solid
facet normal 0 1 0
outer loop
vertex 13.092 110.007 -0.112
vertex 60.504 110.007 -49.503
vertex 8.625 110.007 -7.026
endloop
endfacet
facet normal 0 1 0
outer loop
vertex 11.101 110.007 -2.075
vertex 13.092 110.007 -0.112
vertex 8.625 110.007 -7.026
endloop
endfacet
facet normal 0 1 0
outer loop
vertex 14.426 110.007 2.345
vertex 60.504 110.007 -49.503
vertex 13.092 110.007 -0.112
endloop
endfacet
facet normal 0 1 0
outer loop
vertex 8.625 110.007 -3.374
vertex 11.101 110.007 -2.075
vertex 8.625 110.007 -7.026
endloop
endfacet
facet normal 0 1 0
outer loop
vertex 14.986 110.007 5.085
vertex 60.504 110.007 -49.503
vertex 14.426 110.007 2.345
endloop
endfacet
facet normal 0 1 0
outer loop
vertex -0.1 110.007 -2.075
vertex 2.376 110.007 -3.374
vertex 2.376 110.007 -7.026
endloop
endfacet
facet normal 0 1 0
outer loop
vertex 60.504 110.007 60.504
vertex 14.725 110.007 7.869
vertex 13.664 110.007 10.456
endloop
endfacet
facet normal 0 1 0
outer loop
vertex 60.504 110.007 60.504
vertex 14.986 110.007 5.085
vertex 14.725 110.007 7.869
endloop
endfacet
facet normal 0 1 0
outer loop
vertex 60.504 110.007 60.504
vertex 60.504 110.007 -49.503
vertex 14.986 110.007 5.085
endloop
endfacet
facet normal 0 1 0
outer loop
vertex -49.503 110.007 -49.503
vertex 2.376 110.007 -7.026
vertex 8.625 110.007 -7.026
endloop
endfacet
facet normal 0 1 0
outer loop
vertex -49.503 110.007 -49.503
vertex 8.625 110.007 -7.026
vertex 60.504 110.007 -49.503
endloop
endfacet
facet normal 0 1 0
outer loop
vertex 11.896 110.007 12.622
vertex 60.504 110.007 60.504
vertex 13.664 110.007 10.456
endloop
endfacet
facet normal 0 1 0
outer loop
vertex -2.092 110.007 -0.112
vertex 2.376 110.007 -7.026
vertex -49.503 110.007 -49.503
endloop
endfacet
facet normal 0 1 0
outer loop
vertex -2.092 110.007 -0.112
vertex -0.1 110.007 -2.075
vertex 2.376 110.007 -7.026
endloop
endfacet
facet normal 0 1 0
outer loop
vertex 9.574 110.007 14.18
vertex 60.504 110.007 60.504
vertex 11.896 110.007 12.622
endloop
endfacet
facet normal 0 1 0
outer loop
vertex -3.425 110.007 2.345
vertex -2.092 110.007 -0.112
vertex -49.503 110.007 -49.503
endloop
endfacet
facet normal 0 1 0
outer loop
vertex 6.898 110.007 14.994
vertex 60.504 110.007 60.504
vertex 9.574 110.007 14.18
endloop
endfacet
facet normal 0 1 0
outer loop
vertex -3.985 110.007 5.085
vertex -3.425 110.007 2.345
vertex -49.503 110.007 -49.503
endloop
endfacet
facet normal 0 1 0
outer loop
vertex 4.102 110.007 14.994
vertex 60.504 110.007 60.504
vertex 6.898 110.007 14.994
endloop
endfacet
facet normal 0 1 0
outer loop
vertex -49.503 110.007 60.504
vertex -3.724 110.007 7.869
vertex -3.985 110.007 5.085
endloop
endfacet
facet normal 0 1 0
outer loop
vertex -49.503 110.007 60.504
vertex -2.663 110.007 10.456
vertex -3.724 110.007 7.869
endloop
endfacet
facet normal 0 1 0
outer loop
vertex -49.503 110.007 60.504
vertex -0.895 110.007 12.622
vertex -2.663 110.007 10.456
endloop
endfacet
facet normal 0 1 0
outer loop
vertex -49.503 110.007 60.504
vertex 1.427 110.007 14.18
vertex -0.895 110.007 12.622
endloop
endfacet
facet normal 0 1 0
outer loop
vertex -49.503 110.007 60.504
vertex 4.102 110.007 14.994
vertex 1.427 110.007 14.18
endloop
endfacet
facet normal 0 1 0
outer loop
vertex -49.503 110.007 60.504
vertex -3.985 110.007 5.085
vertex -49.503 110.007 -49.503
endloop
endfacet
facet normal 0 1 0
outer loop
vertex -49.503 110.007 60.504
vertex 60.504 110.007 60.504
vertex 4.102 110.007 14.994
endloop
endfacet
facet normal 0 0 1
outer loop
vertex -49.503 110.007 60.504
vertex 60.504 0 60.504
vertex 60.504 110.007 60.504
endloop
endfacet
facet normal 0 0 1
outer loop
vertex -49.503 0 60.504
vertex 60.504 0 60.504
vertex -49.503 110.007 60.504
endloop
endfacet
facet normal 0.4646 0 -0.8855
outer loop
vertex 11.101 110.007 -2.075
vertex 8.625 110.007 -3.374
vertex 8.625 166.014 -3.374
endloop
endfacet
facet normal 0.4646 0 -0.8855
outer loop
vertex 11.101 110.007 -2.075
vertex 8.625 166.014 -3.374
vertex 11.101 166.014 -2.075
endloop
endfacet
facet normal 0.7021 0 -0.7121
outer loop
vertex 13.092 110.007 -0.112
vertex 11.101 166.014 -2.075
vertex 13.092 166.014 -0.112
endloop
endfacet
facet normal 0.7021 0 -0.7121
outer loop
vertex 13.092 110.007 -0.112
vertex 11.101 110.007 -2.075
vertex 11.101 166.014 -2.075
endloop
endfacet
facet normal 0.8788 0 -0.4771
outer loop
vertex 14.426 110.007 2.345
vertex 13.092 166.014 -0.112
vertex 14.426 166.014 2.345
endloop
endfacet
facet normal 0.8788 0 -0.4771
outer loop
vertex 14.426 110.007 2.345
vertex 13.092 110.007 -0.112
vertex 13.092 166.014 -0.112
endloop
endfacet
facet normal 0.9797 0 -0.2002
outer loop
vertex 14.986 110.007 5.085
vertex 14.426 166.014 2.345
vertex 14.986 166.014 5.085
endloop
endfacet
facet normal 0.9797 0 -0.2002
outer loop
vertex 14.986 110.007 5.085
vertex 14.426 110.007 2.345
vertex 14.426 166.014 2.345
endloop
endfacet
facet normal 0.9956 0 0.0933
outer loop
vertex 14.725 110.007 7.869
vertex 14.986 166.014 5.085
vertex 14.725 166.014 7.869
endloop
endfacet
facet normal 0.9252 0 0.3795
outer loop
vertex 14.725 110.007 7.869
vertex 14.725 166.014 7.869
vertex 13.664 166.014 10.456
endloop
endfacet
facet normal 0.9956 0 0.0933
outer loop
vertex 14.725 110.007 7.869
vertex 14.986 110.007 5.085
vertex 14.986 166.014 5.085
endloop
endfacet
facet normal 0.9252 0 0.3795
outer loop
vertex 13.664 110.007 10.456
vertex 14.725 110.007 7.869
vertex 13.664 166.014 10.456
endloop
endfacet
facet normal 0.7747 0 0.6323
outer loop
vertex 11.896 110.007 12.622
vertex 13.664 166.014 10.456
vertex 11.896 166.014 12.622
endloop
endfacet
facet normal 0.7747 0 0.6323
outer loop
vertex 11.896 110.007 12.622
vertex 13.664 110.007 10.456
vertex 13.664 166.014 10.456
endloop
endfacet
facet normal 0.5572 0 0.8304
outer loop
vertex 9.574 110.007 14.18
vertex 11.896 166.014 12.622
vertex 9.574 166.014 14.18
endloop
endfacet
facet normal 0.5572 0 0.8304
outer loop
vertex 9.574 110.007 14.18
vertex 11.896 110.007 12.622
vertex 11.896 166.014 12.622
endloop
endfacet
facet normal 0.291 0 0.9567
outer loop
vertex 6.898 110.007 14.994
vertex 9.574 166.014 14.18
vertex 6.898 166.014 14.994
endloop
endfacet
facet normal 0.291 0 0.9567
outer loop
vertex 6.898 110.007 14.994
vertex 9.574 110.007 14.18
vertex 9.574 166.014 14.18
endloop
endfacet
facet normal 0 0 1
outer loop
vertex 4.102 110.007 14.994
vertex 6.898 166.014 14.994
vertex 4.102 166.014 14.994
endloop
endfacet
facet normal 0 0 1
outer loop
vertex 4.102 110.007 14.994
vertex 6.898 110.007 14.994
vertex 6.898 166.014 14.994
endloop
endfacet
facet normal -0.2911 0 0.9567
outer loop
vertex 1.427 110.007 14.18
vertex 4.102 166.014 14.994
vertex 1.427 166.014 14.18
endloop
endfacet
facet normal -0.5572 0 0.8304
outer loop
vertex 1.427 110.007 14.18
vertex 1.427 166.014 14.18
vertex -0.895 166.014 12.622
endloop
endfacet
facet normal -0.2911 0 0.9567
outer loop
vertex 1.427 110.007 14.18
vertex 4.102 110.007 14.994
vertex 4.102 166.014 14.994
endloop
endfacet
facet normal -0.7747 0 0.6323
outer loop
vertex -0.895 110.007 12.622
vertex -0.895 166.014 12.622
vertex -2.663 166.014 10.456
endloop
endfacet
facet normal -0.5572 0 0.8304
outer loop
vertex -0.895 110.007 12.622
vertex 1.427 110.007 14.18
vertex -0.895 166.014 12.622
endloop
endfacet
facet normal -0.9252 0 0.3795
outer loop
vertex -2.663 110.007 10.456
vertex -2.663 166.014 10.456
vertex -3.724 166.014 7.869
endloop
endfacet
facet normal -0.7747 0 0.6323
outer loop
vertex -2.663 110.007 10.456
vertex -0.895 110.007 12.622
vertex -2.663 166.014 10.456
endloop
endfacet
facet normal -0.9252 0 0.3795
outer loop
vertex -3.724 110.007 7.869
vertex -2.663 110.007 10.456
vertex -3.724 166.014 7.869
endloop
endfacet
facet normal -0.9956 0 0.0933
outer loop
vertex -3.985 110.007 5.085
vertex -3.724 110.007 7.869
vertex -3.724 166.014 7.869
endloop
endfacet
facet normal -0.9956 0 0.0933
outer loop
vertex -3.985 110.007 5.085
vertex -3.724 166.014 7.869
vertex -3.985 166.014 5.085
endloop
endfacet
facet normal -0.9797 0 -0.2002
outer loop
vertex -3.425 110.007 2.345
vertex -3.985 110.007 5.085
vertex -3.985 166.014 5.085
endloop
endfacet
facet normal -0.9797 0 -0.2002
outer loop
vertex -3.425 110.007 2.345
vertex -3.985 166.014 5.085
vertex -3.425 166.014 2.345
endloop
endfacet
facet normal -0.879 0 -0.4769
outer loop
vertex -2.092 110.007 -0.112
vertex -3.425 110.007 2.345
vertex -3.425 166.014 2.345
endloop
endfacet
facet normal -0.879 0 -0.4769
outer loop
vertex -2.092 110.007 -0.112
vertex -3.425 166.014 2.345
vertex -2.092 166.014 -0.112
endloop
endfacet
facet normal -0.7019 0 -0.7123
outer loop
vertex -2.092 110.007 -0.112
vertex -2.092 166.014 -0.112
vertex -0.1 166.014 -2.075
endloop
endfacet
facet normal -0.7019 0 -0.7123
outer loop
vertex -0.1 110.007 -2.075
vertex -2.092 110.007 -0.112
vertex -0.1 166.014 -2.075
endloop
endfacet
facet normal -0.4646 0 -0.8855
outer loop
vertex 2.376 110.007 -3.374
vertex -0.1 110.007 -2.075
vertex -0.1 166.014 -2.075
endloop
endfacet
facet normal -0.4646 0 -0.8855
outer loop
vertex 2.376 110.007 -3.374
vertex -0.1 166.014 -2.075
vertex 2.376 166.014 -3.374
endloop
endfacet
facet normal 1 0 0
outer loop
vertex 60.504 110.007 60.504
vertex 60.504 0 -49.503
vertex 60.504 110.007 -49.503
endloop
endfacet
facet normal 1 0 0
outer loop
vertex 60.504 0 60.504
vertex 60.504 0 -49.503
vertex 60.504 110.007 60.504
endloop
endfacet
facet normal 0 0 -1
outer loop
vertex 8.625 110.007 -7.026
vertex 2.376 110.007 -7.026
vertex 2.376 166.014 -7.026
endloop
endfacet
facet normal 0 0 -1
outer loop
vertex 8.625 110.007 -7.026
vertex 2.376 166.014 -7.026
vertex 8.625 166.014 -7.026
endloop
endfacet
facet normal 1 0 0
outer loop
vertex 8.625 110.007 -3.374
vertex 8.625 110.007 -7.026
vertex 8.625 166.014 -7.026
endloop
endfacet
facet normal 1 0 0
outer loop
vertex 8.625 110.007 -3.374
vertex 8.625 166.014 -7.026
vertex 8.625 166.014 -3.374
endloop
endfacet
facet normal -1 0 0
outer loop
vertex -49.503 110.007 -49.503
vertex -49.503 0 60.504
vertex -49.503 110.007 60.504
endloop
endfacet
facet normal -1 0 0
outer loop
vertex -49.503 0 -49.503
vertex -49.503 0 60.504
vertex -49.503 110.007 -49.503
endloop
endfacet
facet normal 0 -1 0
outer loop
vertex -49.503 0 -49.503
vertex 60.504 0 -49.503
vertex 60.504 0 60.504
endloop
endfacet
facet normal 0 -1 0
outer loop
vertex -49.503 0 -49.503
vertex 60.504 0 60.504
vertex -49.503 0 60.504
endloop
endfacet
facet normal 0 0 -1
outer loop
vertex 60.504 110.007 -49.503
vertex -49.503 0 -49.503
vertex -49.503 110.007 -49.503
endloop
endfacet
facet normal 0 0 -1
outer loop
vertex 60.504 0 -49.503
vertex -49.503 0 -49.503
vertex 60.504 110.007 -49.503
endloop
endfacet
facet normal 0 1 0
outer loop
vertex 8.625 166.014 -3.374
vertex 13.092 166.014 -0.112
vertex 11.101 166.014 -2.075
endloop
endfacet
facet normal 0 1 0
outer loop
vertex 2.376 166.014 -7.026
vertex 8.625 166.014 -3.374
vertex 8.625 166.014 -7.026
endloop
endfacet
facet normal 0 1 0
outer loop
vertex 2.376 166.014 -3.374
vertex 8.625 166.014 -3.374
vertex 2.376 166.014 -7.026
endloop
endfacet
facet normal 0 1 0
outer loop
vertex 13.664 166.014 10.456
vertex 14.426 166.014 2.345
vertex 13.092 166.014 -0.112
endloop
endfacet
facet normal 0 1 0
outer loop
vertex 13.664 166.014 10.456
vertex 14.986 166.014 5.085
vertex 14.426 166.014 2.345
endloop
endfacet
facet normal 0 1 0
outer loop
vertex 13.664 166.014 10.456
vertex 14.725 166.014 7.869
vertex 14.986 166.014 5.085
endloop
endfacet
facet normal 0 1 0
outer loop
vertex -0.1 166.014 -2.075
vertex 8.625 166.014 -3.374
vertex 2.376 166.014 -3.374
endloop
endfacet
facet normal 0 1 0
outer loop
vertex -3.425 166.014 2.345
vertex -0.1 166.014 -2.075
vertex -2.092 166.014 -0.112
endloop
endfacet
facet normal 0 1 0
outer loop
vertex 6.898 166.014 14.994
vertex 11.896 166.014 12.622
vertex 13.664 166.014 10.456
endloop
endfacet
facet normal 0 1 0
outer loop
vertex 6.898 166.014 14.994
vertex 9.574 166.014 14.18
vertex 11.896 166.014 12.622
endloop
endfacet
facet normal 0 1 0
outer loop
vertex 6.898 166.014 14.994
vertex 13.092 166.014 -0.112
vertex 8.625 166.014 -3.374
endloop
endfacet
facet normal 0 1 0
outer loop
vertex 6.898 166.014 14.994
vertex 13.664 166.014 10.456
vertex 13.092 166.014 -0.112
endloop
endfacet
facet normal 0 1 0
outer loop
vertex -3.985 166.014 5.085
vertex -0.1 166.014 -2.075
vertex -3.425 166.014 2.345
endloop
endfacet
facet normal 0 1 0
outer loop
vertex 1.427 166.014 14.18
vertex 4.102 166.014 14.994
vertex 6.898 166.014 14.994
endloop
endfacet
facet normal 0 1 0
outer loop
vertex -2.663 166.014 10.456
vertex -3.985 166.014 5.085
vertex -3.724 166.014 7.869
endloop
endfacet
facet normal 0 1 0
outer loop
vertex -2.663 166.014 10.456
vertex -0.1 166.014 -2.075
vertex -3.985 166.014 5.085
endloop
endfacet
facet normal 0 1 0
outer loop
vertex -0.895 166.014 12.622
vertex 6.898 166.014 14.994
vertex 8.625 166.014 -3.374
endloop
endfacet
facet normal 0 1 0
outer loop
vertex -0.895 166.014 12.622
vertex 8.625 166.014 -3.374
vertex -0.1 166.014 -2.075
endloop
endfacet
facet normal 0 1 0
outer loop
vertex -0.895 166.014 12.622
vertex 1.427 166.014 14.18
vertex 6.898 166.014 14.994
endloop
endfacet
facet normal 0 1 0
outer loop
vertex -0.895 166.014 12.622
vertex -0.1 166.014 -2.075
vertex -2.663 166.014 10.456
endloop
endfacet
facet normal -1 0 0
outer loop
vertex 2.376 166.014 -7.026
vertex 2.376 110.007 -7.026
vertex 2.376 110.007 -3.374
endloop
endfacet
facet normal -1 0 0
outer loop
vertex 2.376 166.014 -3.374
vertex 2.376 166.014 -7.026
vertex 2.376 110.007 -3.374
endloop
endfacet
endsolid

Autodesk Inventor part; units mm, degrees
ref_plane "YZ Plane" through (0, 0, 0) normal (1, 0, 0) x (0, 1, 0)
ref_plane "XY Plane" through (0, 0, 0) normal (0, 0, 1) x (1, 0, 0)
sketch "Sketch1" plane through (0, 0, 0) normal (0, 1, 0) x (-1, 0, 0)
  line L0 (49.5033, -49.5033) -> (-60.5041, -49.5033)
  line L1 (-60.5041, -49.5033) -> (-60.5041, 60.5041)
  line L2 (-60.5041, 60.5041) -> (49.5033, 60.5041)
  line L3 (49.5033, 60.5041) -> (49.5033, -49.5033)
  point P0 (0, 0)
  dimension "d0" = 110.0074
extrude "Extrusion1" add sketch "Sketch1" along normal blind 110.0074
ref_plane "Work Plane1" through (0, 110.0074, 0) normal (0, 1, 0) x (-1, 0, 0)
sketch "Sketch2" plane through (0, 110.0074, 0) normal (0, 1, 0) x (-1, 0, 0)
  circle A0 centre (-5.5004, 5.5977) radius 9.4996
  line L0 (-60.5041, 60.5041) -> (-60.5041, -49.5033) projected
  line L1 (49.5033, -49.5033) -> (49.5033, 60.5041) projected
  line L2 (-2.3762, -7.0261) -> (-8.6246, -7.0261)
  line L3 (-8.6246, -7.0261) -> (-8.6246, -3.3735)
  line L4 (-2.3762, -7.0261) -> (-2.3762, -3.3735)
  point P0 (0, 0)
  dimension "d4" = 18.9992
  dimension "d5" = 55.0037
  dimension "d8" = 6.2484
  dimension "d9" = 3.1242
extrude "Extrusion2" add sketch "Sketch2" along normal blind 56.007
properties part number "MainMotor"
